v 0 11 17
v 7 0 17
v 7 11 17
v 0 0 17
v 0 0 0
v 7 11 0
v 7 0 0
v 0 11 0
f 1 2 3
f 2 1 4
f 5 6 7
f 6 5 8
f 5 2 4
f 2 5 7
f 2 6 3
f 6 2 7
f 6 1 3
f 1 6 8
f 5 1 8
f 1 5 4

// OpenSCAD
// Generated by SolidPython 1.0.1 on 2020-07-29 00:46:55


cube(size = [7, 11, 17]);
/***********************************************
*********      SolidPython code:      **********
************************************************
 
# import packages: SolidPython
from solid import *
from solid.utils import *
from itertools import chain, combinations, permutations


class Resize:

    def __init__(self, scad_file):
        self.scad_file = scad_file
        #self.scad_file = import_scad(scad_file)
        # cone/cylinder param:
        self.r1 = 0
        self.r2 = 0
        self.h = 0
        # rectangular prism param:
        self.w = 0
        self.l = 0
        # ellipse param:
        self.r = 0

    # import OpenScad code (file name corresponds to shape)


    # classify shape + parameters
    def assign(self, param1, param2, param3):
        if self.scad_file == 'cone.scad':
            self.r1 = param1
            self.r2 = param2
            self.h = param3
        elif self.scad_file == 'cylinder.scad':
            self.r1 = param1
            self.r2 = param2
            self.h = param3
        elif self.scad_file == 'rectangularPrism.scad':
            self.h = param1
            self.l = param2
            self.w = param3
        else:
            self.r = param1
            self.h = param2

    # resize parameters
    def iterate(self):
        x = range(3, 20, 2)
        i = 1
        if self.scad_file == 'cone.scad':
            tempList = list(permutations(x, 2))
            for temp in tempList:
                param1 = temp[0]
                param2 = temp[1]
                filepath = 'produced_scad_files/' + 'cone' + str(param1) + '_' + str(param2) + '_' + '.scad'
                scad_render_to_file(cylinder(h=param1, r1=param2, r2=0), filepath)

        elif self.scad_file == 'cylinder.scad':
            tempList = list(permutations(x, 3))
            for temp in tempList:
                param1 = temp[0]
                param2 = temp[1]
                filepath = 'produced_scad_files/' + 'cylinder' + str(param1) + '_' + str(param2) + '_' + '.scad'
                scad_render_to_file(cylinder(h=param1, r1=param2, r2=param2), filepath)

        elif self.scad_file == 'rectangularPrism.scad':
            tempList = list(permutations(x, 3))
            for temp in tempList:
                param1 = temp[0]
                param2 = temp[1]
                param3 = temp[2]
                filepath = 'produced_scad_files/' + 'rectangularPrism' + str(param1) + '_' + str(param2) + '_' + str(
                    param3) + '.scad'
                scad_render_to_file(cube(size=(param1, param2, param3)), filepath)

        elif self.scad_file == 'ellipse.scad':
            tempList = list(permutations(x, 4))
            for temp in tempList:
                param1 = temp[0]
                param2 = temp[1]
                param3 = temp[2]
                param4 = temp[3]
                filepath = 'produced_scad_files/' + 'ellipse' + str(param1) + '_' + str(param2) + '_' + str(param3) + '_' + str(param4) + '.scad'
                scad_render_to_file(scale([param1, param2, param3])(sphere(r=param4)), filepath)

    def render_to_scadfile(self):
        scad_render_to_file(scad, 'example.scad') 
 
************************************************/
